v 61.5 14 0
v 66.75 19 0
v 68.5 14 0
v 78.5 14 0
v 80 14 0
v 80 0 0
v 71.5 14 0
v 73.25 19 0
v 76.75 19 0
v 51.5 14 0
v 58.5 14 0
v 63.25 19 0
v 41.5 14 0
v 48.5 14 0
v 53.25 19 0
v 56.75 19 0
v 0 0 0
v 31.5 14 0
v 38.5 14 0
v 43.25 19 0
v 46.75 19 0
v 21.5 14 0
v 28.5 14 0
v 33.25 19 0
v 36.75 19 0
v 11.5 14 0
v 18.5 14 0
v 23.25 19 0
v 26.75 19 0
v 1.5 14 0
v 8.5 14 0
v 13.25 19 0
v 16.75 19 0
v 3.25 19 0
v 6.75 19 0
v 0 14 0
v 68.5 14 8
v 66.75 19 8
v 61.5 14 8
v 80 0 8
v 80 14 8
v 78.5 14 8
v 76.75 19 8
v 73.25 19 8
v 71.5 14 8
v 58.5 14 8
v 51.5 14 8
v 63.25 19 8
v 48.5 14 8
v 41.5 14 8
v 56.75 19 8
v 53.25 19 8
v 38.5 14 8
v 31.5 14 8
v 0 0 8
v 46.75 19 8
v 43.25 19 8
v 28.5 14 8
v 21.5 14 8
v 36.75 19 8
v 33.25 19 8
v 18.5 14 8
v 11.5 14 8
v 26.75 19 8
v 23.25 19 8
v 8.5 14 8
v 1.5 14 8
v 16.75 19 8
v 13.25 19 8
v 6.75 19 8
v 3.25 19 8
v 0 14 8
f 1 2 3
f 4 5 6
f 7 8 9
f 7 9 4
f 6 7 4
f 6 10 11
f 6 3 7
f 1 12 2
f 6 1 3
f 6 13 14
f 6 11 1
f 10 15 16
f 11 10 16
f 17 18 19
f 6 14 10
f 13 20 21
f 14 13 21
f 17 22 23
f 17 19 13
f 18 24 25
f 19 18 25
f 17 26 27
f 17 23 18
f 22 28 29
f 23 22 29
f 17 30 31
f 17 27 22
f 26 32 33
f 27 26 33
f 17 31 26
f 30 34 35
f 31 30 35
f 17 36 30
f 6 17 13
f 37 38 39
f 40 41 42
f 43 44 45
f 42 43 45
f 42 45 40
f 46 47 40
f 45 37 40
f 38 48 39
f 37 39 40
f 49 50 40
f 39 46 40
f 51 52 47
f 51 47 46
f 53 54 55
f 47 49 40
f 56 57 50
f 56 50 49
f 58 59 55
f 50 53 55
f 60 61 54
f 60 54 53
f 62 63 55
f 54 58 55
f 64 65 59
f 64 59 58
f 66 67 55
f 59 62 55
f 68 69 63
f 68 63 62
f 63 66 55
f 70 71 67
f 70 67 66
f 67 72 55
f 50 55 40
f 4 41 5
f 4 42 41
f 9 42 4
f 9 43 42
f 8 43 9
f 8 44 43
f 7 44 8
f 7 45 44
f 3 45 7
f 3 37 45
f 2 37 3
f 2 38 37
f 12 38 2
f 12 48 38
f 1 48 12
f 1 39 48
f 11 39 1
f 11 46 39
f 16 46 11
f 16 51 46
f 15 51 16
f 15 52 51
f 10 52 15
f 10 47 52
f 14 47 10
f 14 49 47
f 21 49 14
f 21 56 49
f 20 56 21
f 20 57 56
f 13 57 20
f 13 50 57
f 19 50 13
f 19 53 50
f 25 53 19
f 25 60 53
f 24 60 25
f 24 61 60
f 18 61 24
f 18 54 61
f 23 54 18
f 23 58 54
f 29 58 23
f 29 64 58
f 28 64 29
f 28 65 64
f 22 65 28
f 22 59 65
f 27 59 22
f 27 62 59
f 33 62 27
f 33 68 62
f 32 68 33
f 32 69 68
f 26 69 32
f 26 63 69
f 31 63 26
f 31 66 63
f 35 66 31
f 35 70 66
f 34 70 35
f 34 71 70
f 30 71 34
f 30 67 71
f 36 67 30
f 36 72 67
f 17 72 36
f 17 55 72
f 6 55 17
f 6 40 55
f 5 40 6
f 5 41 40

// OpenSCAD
$fn = 32;

// ----------------------------------------------------------------------
// Gear rack: 8 teeth, pitch 10 mm
// ----------------------------------------------------------------------

// --- parameters (mm) ---
teeth = 8;                // number of teeth
pitch = 10;               // tooth pitch, X
root_w = 7;               // tooth width at the root
tip_w = 3.5;              // tooth width at the tip
base_h = 14;              // rack body height, Y
tooth_h = 5;              // tooth height above the body
plate_t = 8;              // rack width, Z (extrusion height)

rack_l = teeth * pitch;  // overall length
total_h = base_h + tooth_h;  // overall height

profile = [[0, 0], [80, 0], [80, 14], [78.5, 14], [76.75, 19], [73.25, 19], [71.5, 14], [68.5, 14], [66.75, 19], [63.25, 19], [61.5, 14], [58.5, 14], [56.75, 19], [53.25, 19], [51.5, 14], [48.5, 14], [46.75, 19], [43.25, 19], [41.5, 14], [38.5, 14], [36.75, 19], [33.25, 19], [31.5, 14], [28.5, 14], [26.75, 19], [23.25, 19], [21.5, 14], [18.5, 14], [16.75, 19], [13.25, 19], [11.5, 14], [8.5, 14], [6.75, 19], [3.25, 19], [1.5, 14], [0, 14]];  // primary outline, 36 points, counter clockwise

// --- the one profile operation ---
linear_extrude(height = plate_t) polygon(points = profile);
